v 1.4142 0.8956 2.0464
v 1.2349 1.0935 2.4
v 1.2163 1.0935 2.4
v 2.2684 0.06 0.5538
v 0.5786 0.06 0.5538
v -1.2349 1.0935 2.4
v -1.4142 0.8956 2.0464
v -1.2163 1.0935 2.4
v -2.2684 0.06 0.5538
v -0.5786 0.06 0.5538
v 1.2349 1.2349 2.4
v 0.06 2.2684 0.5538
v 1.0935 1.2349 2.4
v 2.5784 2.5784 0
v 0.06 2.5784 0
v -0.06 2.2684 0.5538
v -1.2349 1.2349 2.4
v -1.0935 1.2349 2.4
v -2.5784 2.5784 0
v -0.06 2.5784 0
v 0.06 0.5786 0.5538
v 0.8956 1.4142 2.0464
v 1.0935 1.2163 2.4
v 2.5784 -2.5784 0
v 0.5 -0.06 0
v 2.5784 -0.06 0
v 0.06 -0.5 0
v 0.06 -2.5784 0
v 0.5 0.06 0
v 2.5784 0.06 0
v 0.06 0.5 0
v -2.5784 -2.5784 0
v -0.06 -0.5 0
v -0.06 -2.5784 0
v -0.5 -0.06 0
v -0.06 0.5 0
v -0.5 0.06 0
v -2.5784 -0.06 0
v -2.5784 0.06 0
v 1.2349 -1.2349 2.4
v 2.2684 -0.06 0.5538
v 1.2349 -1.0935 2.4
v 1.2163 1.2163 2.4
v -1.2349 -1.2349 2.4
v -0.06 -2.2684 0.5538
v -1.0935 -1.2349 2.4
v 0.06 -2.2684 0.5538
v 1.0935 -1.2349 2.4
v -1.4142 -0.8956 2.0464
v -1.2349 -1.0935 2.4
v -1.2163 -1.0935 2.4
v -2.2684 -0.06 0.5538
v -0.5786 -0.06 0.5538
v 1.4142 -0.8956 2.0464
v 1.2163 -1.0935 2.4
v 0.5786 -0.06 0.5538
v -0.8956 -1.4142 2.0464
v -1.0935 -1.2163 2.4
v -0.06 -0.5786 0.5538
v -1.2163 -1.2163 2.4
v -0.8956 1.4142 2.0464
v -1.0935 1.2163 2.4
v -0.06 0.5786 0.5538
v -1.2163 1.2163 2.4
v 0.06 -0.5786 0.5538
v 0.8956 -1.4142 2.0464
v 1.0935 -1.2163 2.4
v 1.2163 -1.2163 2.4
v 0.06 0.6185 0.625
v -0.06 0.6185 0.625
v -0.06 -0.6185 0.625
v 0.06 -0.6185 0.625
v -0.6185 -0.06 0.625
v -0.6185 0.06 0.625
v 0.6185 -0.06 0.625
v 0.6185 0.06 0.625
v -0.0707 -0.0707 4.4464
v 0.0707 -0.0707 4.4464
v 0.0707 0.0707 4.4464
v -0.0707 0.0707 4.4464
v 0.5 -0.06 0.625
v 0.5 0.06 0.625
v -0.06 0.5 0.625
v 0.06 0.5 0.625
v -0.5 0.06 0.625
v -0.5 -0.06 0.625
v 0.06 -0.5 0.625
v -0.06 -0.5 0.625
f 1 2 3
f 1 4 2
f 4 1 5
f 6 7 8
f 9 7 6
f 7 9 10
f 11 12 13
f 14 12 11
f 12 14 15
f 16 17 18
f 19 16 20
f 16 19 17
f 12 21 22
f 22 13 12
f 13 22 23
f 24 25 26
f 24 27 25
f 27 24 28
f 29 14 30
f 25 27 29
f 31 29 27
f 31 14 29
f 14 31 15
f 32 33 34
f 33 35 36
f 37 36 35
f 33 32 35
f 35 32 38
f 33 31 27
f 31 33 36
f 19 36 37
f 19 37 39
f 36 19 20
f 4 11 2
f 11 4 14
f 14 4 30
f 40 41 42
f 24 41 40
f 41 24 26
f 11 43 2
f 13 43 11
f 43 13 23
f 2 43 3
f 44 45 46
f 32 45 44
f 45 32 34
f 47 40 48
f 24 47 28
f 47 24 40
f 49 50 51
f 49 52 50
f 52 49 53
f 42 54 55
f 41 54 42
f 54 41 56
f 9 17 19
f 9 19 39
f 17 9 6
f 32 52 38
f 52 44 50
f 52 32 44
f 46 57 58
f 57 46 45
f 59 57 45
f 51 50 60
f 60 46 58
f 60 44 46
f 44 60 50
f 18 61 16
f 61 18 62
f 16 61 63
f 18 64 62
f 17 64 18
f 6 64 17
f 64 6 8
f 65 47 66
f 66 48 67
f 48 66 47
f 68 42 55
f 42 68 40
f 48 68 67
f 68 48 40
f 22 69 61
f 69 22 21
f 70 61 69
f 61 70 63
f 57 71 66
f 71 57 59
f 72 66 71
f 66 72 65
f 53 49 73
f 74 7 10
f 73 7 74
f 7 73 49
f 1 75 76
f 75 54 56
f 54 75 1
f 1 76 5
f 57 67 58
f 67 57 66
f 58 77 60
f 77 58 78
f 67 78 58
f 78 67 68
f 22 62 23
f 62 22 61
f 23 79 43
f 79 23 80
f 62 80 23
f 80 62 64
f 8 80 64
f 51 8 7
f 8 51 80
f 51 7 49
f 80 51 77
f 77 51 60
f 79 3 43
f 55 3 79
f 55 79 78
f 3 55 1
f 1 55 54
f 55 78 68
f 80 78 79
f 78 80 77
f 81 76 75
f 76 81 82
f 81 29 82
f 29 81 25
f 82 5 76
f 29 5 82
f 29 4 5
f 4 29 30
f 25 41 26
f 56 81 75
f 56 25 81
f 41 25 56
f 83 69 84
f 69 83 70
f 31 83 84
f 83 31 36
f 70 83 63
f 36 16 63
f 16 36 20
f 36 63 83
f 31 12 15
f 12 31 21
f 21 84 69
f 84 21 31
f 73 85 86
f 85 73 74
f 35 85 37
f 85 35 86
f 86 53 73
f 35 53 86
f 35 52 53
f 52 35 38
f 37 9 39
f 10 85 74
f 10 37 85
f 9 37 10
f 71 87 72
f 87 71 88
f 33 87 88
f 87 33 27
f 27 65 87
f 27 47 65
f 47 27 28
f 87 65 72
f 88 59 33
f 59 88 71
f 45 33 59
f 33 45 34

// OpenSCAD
// copyright aeropic 2017

// order of sierpinski fractal
order = 1; //[0,1,2,3,4,5,6,7]
// size of smallest pyramid
size = 2.0; //[2:50]

/* [Hidden] */
eps = 0.25;
epsy = 0.12;
epsr = 0.1;
epsh = 2.5*eps;
sq2 = 1.41421356;
epsl = 0.5;

difference() {
    ss(order-1);
    //remove bottom spikes
  #  translate([-120,-120,-3])cube([240,240,3]);
}

      
// sierpinsky recursive code 
module ss(ord){
    k = pow(2,ord);
    w = size *k;
    
    if (k<1){  // end of recursive function
        rotate([0,0,45])cylinder(r1=size,r2 = epsr, h = 1.2*size, $fn=4);
    }
    else {
      difference() {
        union () { // set the five smaller sierpinski pyramids
            // they are shifted so that there is an intersection for spiral vase
            translate([-k*eps+w/sq2,-k*eps+w/sq2,0]) ss(ord-1);  
            translate([k*eps-w/sq2,k*eps-w/sq2,0]) ss(ord-1); 
            translate([k*eps-w/sq2,-k*eps+w/sq2,0]) ss(ord-1); 
            translate([-k*eps+w/sq2,k*eps-w/sq2,0]) ss(ord-1); 
            translate([0,0,-sq2*k*eps+1.2*w]) rotate([180,0,0]) ss(ord-1);
            translate([0,0,-sq2*k*eps+1.2*w]) rotate([0,0,0]) ss(ord-1);    
          
          // petit carré au centre
            cube([0.3,0.3,2], center = true);
             } // end union
     // remove 4 small cubes to allow a sierpinski curve
         # translate([epsl,-epsy/2,0])  cube([sq2*w,epsy,epsh]);
         # rotate([0,0,90]) translate([epsl,-epsy/2,0])  cube([sq2*w,epsy,epsh]);
         # rotate([0,0,180]) translate([epsl,-epsy/2,0])  cube([sq2*w,epsy,epsh]);
         # rotate([0,0,270]) translate([epsl,-epsy/2,0])  cube([sq2*w,epsy,epsh]);
     
    } // end diff    
   } // end else
 } // end module ss
